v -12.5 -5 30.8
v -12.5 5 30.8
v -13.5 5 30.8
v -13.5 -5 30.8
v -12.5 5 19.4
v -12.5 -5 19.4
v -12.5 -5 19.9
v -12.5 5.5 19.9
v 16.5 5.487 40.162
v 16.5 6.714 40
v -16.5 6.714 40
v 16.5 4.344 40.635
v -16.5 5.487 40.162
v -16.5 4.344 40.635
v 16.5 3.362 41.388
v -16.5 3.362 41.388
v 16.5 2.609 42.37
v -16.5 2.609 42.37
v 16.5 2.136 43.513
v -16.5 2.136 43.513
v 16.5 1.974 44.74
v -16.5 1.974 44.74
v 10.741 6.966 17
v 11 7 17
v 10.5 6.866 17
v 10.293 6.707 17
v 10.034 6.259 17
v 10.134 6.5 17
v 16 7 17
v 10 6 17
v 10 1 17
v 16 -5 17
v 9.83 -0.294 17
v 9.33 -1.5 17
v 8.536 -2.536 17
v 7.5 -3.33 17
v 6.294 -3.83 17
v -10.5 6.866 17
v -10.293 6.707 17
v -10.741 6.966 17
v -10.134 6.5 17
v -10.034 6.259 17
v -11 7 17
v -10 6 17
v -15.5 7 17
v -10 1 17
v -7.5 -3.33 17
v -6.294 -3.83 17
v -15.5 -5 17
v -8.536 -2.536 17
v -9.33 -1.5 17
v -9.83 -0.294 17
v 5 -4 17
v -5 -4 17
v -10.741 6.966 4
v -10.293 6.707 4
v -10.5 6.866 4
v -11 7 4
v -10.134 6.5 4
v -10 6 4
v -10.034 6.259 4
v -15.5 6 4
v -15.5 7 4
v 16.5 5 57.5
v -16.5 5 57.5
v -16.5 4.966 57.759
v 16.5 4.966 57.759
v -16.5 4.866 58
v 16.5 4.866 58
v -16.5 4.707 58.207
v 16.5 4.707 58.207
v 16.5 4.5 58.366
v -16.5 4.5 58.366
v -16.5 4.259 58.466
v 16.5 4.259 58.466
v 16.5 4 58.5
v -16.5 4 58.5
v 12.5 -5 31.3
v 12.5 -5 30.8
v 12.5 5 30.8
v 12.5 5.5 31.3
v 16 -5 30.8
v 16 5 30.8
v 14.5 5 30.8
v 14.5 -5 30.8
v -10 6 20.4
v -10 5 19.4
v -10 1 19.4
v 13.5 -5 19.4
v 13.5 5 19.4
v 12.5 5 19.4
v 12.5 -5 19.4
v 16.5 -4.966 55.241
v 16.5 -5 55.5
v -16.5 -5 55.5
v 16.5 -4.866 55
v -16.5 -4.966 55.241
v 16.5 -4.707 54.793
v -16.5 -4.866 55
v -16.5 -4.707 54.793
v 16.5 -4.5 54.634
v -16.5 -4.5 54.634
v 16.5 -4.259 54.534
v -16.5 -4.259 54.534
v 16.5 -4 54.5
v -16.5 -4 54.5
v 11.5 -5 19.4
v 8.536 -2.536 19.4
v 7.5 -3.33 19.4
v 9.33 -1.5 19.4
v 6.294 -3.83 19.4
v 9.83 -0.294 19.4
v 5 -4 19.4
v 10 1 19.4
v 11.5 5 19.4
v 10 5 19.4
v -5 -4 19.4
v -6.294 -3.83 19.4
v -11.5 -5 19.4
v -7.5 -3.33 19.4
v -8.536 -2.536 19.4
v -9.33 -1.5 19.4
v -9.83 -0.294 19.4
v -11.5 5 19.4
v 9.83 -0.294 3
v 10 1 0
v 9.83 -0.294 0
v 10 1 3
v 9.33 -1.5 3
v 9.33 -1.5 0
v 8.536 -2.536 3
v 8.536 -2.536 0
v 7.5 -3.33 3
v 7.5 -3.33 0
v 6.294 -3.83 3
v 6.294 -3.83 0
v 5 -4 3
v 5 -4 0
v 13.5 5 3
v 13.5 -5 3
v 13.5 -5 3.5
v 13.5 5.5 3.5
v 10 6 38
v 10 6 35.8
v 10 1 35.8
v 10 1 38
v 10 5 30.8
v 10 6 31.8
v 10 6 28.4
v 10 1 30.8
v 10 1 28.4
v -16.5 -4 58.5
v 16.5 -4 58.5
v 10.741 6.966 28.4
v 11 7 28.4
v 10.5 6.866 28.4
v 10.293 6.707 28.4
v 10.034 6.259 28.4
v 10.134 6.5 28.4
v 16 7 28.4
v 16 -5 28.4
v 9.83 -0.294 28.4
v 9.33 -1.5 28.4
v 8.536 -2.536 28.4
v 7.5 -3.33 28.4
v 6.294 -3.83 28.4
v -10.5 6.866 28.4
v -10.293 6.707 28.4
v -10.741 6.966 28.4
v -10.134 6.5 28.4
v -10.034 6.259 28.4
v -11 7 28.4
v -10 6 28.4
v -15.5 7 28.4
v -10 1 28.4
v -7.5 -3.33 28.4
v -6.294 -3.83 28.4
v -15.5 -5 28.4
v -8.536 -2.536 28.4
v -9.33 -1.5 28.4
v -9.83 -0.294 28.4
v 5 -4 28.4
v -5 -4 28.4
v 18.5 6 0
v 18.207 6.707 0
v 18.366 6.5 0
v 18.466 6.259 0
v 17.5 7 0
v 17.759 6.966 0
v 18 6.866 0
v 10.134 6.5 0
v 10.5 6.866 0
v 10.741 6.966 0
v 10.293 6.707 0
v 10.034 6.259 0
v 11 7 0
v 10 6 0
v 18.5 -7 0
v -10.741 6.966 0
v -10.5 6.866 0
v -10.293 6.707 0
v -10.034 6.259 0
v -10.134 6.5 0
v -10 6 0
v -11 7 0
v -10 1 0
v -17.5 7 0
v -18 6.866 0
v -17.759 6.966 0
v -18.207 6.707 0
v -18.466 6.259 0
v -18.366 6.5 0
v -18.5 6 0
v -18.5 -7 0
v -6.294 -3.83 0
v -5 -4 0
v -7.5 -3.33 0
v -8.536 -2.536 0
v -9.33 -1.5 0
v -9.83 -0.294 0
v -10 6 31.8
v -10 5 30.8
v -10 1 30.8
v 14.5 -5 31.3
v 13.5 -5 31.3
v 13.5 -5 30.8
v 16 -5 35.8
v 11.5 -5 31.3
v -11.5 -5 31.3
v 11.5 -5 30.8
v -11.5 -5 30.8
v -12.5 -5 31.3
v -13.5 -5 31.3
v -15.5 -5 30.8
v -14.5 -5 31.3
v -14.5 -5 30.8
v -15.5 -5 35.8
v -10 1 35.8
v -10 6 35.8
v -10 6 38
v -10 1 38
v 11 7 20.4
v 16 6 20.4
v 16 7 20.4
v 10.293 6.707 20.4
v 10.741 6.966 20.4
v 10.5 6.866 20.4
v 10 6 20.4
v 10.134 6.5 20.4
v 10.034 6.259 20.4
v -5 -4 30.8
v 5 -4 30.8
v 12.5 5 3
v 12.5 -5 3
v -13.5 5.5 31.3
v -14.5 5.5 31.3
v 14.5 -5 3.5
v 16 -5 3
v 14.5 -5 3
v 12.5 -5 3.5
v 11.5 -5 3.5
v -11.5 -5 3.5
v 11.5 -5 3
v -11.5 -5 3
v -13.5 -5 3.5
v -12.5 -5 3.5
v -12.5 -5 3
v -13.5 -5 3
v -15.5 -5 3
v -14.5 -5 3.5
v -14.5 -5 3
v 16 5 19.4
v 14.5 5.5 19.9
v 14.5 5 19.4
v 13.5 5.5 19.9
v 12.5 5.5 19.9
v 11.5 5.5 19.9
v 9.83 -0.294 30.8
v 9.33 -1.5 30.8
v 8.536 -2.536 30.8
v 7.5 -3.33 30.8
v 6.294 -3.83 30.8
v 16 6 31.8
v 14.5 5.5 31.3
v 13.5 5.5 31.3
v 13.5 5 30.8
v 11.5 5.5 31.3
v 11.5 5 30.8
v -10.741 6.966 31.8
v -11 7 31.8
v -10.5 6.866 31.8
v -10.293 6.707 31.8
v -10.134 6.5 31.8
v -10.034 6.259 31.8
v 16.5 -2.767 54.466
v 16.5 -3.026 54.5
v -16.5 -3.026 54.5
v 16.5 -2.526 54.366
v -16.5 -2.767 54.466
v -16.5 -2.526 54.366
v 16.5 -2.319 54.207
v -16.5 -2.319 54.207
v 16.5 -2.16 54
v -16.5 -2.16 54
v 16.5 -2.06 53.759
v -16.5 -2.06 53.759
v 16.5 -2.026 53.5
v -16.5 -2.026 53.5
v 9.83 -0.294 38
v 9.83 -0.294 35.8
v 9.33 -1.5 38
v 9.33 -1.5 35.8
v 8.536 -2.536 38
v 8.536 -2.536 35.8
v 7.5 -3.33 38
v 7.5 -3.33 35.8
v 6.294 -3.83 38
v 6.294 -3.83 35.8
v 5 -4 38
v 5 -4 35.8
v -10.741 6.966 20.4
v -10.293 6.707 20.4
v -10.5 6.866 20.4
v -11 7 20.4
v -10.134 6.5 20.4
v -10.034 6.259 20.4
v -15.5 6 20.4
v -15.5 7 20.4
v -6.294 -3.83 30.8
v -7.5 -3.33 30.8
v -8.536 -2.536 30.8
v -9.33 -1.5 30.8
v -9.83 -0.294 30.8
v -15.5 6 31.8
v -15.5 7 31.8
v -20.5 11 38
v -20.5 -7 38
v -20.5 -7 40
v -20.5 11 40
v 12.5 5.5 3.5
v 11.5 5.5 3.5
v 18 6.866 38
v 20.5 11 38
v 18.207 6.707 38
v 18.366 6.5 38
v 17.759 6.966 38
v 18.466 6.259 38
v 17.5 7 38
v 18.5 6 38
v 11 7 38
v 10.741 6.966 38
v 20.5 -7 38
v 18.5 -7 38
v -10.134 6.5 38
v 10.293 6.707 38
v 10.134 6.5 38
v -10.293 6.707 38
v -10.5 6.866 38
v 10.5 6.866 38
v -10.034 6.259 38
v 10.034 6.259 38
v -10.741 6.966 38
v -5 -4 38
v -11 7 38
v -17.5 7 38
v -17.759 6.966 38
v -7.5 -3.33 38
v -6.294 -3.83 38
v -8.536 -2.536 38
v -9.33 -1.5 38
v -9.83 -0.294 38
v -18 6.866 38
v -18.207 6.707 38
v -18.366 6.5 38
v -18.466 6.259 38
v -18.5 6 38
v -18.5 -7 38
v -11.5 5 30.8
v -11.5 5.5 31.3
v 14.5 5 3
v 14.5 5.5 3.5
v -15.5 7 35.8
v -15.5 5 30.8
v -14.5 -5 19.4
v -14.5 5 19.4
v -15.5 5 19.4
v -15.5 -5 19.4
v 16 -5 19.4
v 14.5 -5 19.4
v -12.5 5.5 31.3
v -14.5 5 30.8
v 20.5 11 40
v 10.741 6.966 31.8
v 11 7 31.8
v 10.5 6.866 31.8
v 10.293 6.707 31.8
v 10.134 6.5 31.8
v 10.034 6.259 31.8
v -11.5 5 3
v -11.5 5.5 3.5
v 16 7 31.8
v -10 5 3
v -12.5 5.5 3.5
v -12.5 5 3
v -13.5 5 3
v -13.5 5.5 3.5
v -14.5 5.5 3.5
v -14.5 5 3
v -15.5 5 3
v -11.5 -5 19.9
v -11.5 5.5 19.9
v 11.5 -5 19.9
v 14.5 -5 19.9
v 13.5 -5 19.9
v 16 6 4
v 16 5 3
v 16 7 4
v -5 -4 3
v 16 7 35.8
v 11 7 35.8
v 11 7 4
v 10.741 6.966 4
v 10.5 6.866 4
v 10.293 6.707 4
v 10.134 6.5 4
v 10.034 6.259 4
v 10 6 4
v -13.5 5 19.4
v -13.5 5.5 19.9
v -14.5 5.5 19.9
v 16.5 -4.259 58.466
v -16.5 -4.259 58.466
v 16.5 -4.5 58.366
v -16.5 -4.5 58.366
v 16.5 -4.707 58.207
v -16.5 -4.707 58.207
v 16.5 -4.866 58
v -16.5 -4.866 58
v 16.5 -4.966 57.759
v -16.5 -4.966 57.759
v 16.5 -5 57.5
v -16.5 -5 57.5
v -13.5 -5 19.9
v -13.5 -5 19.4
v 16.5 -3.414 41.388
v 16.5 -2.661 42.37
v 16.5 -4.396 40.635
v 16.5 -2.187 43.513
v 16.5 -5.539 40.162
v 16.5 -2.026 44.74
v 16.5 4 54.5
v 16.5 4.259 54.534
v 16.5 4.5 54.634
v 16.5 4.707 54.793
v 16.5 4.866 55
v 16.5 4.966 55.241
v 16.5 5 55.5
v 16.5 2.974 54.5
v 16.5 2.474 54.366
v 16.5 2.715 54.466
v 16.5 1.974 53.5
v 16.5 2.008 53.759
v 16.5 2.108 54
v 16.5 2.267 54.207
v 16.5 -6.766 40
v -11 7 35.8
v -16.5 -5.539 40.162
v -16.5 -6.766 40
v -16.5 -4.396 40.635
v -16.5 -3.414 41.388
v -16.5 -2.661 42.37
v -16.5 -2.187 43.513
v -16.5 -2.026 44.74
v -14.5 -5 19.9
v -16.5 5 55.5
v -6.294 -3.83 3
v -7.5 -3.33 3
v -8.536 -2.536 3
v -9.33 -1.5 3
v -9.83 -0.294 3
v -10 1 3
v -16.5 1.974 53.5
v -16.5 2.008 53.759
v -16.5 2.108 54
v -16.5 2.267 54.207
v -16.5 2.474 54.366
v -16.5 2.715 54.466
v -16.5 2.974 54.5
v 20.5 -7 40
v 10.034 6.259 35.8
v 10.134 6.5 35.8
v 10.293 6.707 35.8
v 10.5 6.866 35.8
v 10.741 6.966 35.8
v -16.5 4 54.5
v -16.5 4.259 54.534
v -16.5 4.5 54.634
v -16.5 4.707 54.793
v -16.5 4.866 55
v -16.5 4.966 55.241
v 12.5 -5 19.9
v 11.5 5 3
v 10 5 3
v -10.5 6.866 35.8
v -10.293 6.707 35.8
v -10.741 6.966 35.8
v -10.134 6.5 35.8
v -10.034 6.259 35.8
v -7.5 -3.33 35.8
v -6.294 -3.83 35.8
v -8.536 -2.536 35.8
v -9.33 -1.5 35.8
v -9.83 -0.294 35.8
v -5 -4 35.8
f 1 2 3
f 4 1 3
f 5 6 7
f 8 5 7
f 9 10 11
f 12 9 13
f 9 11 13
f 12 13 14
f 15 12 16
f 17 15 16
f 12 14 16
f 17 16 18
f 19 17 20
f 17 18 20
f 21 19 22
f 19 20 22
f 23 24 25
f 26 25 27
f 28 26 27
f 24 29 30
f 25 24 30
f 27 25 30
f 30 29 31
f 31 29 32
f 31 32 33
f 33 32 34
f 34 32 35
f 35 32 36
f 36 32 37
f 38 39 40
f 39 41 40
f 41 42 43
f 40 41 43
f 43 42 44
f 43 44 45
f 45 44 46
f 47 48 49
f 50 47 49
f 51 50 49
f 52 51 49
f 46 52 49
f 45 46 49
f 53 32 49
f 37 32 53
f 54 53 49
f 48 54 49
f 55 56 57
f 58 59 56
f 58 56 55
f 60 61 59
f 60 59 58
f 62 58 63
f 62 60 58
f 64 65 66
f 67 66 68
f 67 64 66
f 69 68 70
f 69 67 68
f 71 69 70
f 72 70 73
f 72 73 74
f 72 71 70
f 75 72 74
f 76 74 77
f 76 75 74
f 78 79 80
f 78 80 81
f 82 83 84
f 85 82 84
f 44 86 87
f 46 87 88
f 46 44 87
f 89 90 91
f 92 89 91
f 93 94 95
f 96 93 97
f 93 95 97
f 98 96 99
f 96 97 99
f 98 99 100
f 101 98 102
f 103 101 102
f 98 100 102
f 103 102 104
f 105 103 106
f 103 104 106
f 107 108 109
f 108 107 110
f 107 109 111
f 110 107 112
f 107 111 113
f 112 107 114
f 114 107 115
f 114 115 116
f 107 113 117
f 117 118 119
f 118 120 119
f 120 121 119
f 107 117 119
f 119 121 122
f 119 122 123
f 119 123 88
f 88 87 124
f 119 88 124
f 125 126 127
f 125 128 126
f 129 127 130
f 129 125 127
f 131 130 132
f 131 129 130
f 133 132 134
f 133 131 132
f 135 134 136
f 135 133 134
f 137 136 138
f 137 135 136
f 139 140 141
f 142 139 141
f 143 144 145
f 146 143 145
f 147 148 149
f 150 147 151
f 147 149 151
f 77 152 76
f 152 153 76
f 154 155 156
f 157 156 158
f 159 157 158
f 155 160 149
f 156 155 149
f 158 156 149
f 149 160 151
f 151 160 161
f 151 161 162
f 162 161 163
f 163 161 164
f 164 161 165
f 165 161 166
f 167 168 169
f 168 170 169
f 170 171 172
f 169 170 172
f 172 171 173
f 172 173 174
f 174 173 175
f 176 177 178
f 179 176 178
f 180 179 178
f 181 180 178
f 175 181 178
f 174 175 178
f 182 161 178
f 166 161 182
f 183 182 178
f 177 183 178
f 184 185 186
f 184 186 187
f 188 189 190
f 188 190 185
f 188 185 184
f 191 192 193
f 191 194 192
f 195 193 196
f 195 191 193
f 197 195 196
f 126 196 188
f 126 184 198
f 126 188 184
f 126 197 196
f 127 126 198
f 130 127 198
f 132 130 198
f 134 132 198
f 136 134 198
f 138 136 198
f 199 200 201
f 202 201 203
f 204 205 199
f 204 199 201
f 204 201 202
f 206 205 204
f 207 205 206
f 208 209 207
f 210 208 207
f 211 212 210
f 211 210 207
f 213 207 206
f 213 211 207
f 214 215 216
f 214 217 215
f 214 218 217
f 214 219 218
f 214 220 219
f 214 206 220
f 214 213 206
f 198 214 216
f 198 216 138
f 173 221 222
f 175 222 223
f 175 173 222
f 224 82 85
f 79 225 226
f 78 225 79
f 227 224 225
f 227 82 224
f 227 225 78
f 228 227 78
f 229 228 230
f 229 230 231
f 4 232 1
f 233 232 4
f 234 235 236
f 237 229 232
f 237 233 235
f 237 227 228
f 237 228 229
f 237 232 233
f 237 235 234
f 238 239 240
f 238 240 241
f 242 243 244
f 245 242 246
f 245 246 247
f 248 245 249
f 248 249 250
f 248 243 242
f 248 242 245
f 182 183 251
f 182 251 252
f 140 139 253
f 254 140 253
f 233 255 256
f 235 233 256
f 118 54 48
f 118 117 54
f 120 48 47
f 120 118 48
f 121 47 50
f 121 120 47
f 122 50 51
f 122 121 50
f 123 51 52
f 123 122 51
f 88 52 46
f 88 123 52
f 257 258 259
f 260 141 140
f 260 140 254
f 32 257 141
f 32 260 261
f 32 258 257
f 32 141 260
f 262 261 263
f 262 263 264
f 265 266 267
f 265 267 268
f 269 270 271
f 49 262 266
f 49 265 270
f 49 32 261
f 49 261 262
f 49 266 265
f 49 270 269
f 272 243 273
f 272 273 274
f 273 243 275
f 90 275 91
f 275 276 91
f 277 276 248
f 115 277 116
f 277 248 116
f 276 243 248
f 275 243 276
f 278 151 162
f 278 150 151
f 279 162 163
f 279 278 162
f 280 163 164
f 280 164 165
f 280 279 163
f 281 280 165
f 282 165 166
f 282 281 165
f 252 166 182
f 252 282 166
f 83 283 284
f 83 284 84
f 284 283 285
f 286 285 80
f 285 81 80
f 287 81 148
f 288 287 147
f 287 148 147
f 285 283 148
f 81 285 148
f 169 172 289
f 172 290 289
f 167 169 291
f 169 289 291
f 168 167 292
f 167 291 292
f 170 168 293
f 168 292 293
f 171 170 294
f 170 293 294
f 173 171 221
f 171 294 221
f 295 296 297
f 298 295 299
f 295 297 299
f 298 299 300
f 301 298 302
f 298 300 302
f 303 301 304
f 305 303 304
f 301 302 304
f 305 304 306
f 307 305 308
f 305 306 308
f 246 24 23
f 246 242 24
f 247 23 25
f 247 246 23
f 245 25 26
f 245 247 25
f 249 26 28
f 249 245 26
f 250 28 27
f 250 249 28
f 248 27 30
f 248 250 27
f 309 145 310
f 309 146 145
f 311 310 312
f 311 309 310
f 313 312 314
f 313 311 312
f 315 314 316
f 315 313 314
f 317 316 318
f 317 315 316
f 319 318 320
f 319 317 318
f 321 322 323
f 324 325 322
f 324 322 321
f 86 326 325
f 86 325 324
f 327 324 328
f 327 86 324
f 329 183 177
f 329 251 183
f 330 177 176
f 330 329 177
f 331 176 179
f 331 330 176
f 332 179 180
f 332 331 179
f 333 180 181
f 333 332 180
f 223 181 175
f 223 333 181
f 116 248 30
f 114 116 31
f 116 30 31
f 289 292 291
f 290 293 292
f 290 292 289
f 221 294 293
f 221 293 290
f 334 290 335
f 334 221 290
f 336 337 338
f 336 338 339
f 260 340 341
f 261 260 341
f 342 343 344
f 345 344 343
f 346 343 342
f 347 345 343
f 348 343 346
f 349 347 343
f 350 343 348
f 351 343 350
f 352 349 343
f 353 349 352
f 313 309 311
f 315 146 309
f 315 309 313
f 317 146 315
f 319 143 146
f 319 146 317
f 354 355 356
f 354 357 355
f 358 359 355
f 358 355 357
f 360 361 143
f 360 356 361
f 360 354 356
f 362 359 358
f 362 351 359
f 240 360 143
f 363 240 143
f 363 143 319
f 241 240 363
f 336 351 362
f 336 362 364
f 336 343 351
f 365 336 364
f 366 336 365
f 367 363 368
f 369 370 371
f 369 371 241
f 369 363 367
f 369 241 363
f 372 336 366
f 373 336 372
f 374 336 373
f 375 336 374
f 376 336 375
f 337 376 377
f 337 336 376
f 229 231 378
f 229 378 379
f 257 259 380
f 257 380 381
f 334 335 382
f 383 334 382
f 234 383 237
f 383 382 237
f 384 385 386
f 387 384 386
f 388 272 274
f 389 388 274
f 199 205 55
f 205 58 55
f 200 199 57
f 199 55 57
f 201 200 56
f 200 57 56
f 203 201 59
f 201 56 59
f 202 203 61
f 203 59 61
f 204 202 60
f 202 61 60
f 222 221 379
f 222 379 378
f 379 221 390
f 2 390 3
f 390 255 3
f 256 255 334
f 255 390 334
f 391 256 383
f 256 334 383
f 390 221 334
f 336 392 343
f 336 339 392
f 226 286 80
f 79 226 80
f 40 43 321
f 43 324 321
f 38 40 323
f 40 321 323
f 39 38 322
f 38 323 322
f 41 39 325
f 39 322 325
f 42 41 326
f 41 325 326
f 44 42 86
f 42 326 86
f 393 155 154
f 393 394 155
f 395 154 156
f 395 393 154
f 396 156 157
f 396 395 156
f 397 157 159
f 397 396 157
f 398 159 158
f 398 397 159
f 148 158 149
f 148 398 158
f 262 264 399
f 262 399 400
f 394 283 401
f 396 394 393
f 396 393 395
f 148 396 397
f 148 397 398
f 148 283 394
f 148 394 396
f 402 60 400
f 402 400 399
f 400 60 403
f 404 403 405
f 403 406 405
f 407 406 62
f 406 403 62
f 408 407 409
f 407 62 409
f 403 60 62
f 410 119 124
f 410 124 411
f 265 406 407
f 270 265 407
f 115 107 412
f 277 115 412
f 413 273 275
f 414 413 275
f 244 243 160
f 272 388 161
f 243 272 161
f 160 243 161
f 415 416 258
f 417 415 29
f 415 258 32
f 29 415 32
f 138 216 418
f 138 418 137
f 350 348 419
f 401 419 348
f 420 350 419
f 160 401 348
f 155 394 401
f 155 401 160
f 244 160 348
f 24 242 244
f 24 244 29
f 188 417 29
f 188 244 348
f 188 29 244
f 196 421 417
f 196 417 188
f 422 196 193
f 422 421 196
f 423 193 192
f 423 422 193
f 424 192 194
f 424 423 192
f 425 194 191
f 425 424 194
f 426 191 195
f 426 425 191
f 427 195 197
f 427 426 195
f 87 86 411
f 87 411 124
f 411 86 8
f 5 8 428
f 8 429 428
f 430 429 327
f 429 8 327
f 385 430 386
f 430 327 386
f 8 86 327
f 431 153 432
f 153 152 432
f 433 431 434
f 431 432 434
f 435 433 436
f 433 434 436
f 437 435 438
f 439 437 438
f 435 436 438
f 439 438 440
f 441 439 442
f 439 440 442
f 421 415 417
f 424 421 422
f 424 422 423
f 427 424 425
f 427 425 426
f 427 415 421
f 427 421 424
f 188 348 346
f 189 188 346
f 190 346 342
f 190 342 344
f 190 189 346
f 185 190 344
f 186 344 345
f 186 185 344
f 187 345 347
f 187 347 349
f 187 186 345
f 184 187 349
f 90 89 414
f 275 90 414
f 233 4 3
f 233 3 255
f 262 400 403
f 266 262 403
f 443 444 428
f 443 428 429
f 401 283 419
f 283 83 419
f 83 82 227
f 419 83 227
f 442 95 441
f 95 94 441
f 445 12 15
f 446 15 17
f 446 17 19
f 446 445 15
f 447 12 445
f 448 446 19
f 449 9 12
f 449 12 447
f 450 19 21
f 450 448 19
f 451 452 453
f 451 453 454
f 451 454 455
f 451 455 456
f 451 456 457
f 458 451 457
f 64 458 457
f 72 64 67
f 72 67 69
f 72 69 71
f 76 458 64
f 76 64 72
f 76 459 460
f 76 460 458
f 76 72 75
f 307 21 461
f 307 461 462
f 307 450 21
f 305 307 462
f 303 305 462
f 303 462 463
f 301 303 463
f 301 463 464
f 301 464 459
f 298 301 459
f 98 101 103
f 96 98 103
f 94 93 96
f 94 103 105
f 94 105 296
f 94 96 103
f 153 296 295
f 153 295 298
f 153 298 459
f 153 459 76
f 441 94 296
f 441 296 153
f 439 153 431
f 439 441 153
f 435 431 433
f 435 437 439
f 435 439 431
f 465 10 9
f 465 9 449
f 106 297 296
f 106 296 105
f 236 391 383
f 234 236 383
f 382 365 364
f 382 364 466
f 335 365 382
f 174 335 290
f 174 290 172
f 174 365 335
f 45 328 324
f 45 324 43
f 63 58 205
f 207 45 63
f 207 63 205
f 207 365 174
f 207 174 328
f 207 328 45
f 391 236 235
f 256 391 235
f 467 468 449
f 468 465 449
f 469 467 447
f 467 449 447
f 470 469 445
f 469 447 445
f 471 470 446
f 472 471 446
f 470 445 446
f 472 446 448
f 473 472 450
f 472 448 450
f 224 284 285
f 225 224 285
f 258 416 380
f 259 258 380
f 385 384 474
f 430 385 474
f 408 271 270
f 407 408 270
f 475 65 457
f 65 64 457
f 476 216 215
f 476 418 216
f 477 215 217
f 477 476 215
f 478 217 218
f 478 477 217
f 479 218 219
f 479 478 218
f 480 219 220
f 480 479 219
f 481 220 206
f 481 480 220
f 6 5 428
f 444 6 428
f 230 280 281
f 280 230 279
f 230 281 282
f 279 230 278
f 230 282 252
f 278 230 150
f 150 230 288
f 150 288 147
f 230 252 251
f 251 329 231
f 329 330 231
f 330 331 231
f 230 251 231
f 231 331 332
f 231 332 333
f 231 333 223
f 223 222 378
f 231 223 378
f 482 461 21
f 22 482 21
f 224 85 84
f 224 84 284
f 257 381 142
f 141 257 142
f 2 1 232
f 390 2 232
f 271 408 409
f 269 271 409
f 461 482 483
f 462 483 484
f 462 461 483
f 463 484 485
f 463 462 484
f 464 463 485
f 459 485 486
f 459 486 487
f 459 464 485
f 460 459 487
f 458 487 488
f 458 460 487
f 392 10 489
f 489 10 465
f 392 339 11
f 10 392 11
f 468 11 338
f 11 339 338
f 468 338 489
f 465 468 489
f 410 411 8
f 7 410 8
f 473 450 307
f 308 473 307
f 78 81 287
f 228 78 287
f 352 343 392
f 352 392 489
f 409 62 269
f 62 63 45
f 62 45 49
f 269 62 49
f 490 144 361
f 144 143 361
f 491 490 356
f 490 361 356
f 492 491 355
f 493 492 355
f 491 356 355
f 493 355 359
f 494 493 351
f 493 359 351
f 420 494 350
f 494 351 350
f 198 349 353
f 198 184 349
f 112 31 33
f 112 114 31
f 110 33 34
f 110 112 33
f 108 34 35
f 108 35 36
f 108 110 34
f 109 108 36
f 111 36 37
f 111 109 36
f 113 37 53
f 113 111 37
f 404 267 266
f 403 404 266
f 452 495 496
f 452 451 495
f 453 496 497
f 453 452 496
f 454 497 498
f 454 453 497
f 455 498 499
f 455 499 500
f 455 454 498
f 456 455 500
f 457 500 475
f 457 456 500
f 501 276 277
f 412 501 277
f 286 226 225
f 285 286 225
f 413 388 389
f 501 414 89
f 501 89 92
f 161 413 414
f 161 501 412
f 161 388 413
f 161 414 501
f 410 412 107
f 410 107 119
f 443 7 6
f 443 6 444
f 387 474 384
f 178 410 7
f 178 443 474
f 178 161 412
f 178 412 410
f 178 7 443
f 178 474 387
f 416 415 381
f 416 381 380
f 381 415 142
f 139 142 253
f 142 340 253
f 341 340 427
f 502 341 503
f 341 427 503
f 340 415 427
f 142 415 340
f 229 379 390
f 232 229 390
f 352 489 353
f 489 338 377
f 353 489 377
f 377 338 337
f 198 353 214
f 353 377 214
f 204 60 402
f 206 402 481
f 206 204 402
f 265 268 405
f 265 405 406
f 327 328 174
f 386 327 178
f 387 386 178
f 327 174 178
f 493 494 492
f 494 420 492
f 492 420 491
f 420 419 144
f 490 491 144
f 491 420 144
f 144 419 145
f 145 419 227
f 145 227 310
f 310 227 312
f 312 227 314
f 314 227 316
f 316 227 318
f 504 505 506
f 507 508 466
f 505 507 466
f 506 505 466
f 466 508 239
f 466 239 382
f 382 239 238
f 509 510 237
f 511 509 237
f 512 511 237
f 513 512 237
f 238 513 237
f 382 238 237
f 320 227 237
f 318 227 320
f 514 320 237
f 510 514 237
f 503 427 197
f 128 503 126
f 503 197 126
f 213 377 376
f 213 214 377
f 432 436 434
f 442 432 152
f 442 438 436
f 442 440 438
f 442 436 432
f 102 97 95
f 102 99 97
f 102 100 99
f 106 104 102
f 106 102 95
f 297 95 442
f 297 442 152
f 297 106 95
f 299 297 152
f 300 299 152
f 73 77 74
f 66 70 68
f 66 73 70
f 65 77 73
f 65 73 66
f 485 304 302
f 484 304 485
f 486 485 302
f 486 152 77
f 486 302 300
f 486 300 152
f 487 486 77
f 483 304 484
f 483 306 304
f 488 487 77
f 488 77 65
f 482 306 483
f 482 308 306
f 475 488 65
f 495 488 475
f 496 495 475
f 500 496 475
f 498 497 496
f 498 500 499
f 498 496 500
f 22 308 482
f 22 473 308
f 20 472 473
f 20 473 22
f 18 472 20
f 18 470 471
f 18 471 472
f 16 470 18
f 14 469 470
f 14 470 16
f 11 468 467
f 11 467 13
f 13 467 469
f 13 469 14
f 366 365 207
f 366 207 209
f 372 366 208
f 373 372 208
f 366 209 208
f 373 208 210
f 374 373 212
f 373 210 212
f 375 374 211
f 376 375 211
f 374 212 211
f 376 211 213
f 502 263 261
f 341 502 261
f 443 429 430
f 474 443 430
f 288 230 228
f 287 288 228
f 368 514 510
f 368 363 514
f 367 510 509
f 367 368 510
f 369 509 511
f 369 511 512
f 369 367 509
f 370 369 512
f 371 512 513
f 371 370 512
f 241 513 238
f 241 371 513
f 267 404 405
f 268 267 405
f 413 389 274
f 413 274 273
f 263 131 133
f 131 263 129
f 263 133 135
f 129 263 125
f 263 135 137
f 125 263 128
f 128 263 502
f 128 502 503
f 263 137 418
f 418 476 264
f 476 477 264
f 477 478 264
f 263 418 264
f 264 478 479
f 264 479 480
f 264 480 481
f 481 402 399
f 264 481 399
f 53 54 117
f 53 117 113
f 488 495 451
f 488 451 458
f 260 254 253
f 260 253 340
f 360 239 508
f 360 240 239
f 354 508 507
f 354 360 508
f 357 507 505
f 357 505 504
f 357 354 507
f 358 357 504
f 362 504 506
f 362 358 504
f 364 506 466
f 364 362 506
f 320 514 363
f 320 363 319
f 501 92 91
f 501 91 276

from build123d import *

# Parameters (mm, degrees)
SKETCH_W           = 33
SKETCH_H           = 14
PAD_DEPTH          = 38
SKETCH001_W        = 4
SKETCH001_H        = 58.5
PAD001_DEPTH       = 33
SKETCH002_W        = 10
SKETCH002_H        = 4
PAD002_DEPTH       = 33
SKETCH003_W        = 32
SKETCH003_H        = 5
SKETCH003_H_2      = 9
SKETCH003_H_3      = 14
POCKET_DEPTH       = 12
POCKET_FACE14_W    = 33
POCKET_FACE14_H    = 38
POCKET_FACE14_W_2  = 32
POCKET_FACE14_H_2  = 5
POCKET_FACE14_H_3  = 9
POCKET_FACE14_H_4  = 14
POCKET001_DEPTH    = 2
SKETCH004_W        = 33
SKETCH004_H        = 38
SKETCH004_W_2      = 32
SKETCH004_H_2      = 4
SKETCH004_H_3      = 8
SKETCH004_H_4      = 13
PAD003_DEPTH       = 2
POCKET002_DEPTH    = 1
POCKET003_DEPTH    = 31.5
SKETCH006_W        = 14
SKETCH006_H        = 38
PAD004_DEPTH       = 1
PAD005_DEPTH       = 1
SKETCH007_W        = 37
SKETCH007_H        = 14
PAD006_DEPTH       = 2
SKETCH008_W        = 37
SKETCH008_H        = 2
PAD007_DEPTH       = 4
FILLET_R           = 4.74
FILLET001_R        = 4.74
FILLET002_R        = 1
FILLET003_R        = 1
FILLET004_R        = 1
FILLET005_R        = 1
FILLET005_FACE22_W = 18
FILLET005_FACE22_H = 2
PAD008_DEPTH       = 2
PAD008_FACE3_W     = 14
PAD008_FACE3_H     = 38
PAD009_DEPTH       = 2
PAD009_FACE3_W     = 18
PAD009_FACE3_H     = 2
PAD010_DEPTH       = 2
PAD010_FACE1_W     = 14
PAD010_FACE1_H     = 38
PAD011_DEPTH       = 2
SKETCH009_W        = 20
SKETCH009_H        = 11
POCKET004_DEPTH    = 38
FILLET006_R        = 5
FILLET007_R        = 1
FILLET008_R        = 1
SKETCH010_W        = 1
SKETCH010_H        = 0.5
PAD012_DEPTH       = 12


with BuildPart() as part:
    # Sketch → Pad (new body)
    with BuildSketch(Plane.XY):
        Rectangle(SKETCH_W, SKETCH_H)
    extrude(amount=PAD_DEPTH)

    # Sketch001 (on Face2 of Pad) → Pad001 (join)
    with BuildSketch(Plane.YZ.offset(16.5)):
        with Locations((-0.02597, 29.25)):
            Rectangle(SKETCH001_W, SKETCH001_H)
    extrude(amount=-PAD001_DEPTH)

    # Sketch002 (on Face9 of Pad001) → Pad002 (join)
    with BuildSketch(Plane.YZ.offset(16.5)):
        with Locations((0, 56.5)):
            Rectangle(SKETCH002_W, SKETCH002_H)
    extrude(amount=-PAD002_DEPTH)

    # Sketch003 (on Face4 of Pad002) → Pocket (cut)
    with BuildSketch(Plane(origin=(0, 7, 0), x_dir=(-1, 0, 0), z_dir=(0, 1, 0))):
        with Locations((0, 33.3)):
            Rectangle(SKETCH003_W, SKETCH003_H)
        with Locations((0, 23.9)):
            Rectangle(SKETCH003_W, SKETCH003_H_2)
        with Locations((0, 10)):
            Rectangle(SKETCH003_W, SKETCH003_H_3)
    extrude(amount=-POCKET_DEPTH, mode=Mode.SUBTRACT)

    # Pocket Face14 → Pocket001 (cut)
    with BuildSketch(Plane(origin=(0, 7, 19.929609), x_dir=(1, 0, 0), z_dir=(0, 1, 0))):
        with Locations((0, 0.929609)):
            Rectangle(POCKET_FACE14_W, POCKET_FACE14_H)
        with Locations((0, -13.370391)):
            Rectangle(POCKET_FACE14_W_2, POCKET_FACE14_H_2, mode=Mode.SUBTRACT)
        with Locations((0, -3.970391)):
            Rectangle(POCKET_FACE14_W_2, POCKET_FACE14_H_3, mode=Mode.SUBTRACT)
        with Locations((0, 9.929609)):
            Rectangle(POCKET_FACE14_W_2, POCKET_FACE14_H_4, mode=Mode.SUBTRACT)
    extrude(amount=-POCKET001_DEPTH, mode=Mode.SUBTRACT)

    # Sketch004 (on Face6 of Pocket001) → Pad003 (join)
    with BuildSketch(Plane(origin=(0, 5, 0), x_dir=(-1, 0, 0), z_dir=(0, 1, 0))):
        with Locations((0, 19)):
            Rectangle(SKETCH004_W, SKETCH004_H)
        with Locations((0, 33.8)):
            Rectangle(SKETCH004_W_2, SKETCH004_H_2, mode=Mode.SUBTRACT)
        with Locations((0, 24.4)):
            Rectangle(SKETCH004_W_2, SKETCH004_H_3, mode=Mode.SUBTRACT)
        with Locations((0, 10.5)):
            Rectangle(SKETCH004_W_2, SKETCH004_H_4, mode=Mode.SUBTRACT)
    extrude(amount=PAD003_DEPTH)

    # Pad003 Face14 → Pocket002 (cut)
    with BuildSketch(Plane(origin=(-16.5, -0.002687, 24.170063), x_dir=(0, 1, 0), z_dir=(-1, 0, 0))):
        Polygon((1.976717, -13.829937), (7.002687, -13.829937), (7.002687, 24.170063), (-6.997313, 24.170063), (-6.997313, -13.829937), (-2.023283, -13.829937), (-2.023283, -30.329937), (-4.997313, -30.329937), (-4.997313, -34.329937), (5.002687, -34.329937), (5.002687, -30.329937), (1.976717, -30.329937), align=None)
    extrude(amount=-POCKET002_DEPTH, mode=Mode.SUBTRACT)

    # Sketch005 (on Face4 of Pocket002) → Pocket003 (cut)
    with BuildSketch(Plane(origin=(-15.5, 0, 0), x_dir=(0, -1, 0), z_dir=(-1, 0, 0))):
        Polygon((-5, 3), (-5, 4), (-6, 4), align=None)
        Polygon((-5, 19.4), (-5, 20.4), (-6, 20.4), align=None)
        Polygon((-5, 30.8), (-5, 31.8), (-6, 31.8), align=None)
    extrude(amount=-POCKET003_DEPTH, mode=Mode.SUBTRACT)

    # Sketch006 (on Face4 of Pocket003) → Pad004 (join)
    with BuildSketch(Plane(origin=(-15.5, 0, 0), x_dir=(0, -1, 0), z_dir=(-1, 0, 0))):
        with Locations((0, 19)):
            Rectangle(SKETCH006_W, SKETCH006_H)
    extrude(amount=PAD004_DEPTH)

    # Pad004 Face9 → Pad005 (add)
    with BuildSketch(Plane(origin=(-15.5, -0.01617, 50.117925), x_dir=(0, 1, 0), z_dir=(-1, 0, 0))):
        Polygon((1.9902, -4.382075), (1.9902, 12.117925), (-2.0098, 12.117925), (-2.0098, -4.382075), (-4.98383, -4.382075), (-4.98383, -8.382075), (5.01617, -8.382075), (5.01617, -4.382075), align=None)
    extrude(amount=PAD005_DEPTH)

    # Sketch007 (on Face5 of Pad005) → Pad006 (join)
    with BuildSketch(Plane.XY.offset(38)):
        Rectangle(SKETCH007_W, SKETCH007_H)
    extrude(amount=PAD006_DEPTH)

    # Sketch008 (on Face19 of Pad006) → Pad007 (join)
    with BuildSketch(Plane(origin=(0, 7, 0), x_dir=(-1, 0, 0), z_dir=(0, 1, 0))):
        with Locations((0, 39)):
            Rectangle(SKETCH008_W, SKETCH008_H)
    extrude(amount=PAD007_DEPTH)

    # Fillet
    fillet_edges = [part.edges().sort_by_distance(p)[0] for p in [
        (0, -2.02597, 40),
    ]]
    fillet(fillet_edges, radius=FILLET_R)

    # Fillet001
    fillet001_edges = [part.edges().sort_by_distance(p)[0] for p in [
        (0, 1.97403, 40),
    ]]
    fillet(fillet001_edges, radius=FILLET001_R)

    # Fillet002
    fillet002_edges = [part.edges().sort_by_distance(p)[0] for p in [
        (0, -2.02597, 54.5),
    ]]
    fillet(fillet002_edges, radius=FILLET002_R)

    # Fillet003
    fillet003_edges = [part.edges().sort_by_distance(p)[0] for p in [
        (0, 1.97403, 54.5),
    ]]
    fillet(fillet003_edges, radius=FILLET003_R)

    # Fillet004
    fillet004_edges = [part.edges().sort_by_distance(p)[0] for p in [
        (0, 5, 54.5),
        (0, 5, 58.5),
    ]]
    fillet(fillet004_edges, radius=FILLET004_R)

    # Fillet005
    fillet005_edges = [part.edges().sort_by_distance(p)[0] for p in [
        (0, -5, 58.5),
        (0, -5, 54.5),
    ]]
    fillet(fillet005_edges, radius=FILLET005_R)

    # Fillet005 Face22 → Pad008 (add)
    with BuildSketch(Plane(origin=(-18.5, 2, 39), x_dir=(0, 1, 0), z_dir=(-1, 0, 0))):
        Rectangle(FILLET005_FACE22_W, FILLET005_FACE22_H)
    extrude(amount=PAD008_DEPTH)

    # Pad008 Face3 → Pad009 (add)
    with BuildSketch(Plane(origin=(-16.5, 0, 19), x_dir=(0, 1, 0), z_dir=(-1, 0, 0))):
        Rectangle(PAD008_FACE3_W, PAD008_FACE3_H)
    extrude(amount=PAD009_DEPTH)

    # Pad009 Face3 → Pad010 (add)
    with BuildSketch(Plane(origin=(18.5, 2, 39), x_dir=(0, -1, 0), z_dir=(1, 0, 0))):
        Rectangle(PAD009_FACE3_W, PAD009_FACE3_H)
    extrude(amount=PAD010_DEPTH)

    # Pad010 Face1 → Pad011 (add)
    with BuildSketch(Plane(origin=(16.5, 0, 19), x_dir=(0, -1, 0), z_dir=(1, 0, 0))):
        Rectangle(PAD010_FACE1_W, PAD010_FACE1_H)
    extrude(amount=PAD011_DEPTH)

    # Sketch009 (on Face47 of Pad011) → Pocket004 (cut)
    with BuildSketch(Plane(origin=(0, 0, 0), x_dir=(1, 0, 0), z_dir=(0, 0, -1))):
        with Locations((0, -1.5)):
            Rectangle(SKETCH009_W, SKETCH009_H)
    extrude(amount=-POCKET004_DEPTH, mode=Mode.SUBTRACT)

    # Fillet006
    fillet006_edges = [part.edges().sort_by_distance(p)[0] for p in [
        (-10, -4, 36.9),
        (-10, -4, 29.6),
        (-10, -4, 18.2),
        (-10, -4, 1.5),
        (10, -4, 36.9),
        (10, -4, 29.6),
        (10, -4, 18.2),
        (10, -4, 1.5),
    ]]
    fillet(fillet006_edges, radius=FILLET006_R)

    # Fillet007
    fillet007_edges = [part.edges().sort_by_distance(p)[0] for p in [
        (-10, 7, 36.9),
        (-10, 7, 30.1),
        (-10, 7, 18.7),
        (-10, 7, 2),
        (10, 7, 36.9),
        (10, 7, 30.1),
        (10, 7, 18.7),
        (10, 7, 2),
    ]]
    fillet(fillet007_edges, radius=FILLET007_R)

    # Fillet008
    fillet008_edges = [part.edges().sort_by_distance(p)[0] for p in [
        (18.5, 7, 19),
        (-18.5, 7, 19),
    ]]
    fillet(fillet008_edges, radius=FILLET008_R)

    # Sketch010 (on Face53 of Fillet008) → Pad012 (join)
    with BuildSketch(Plane(origin=(0, -5, 0), x_dir=(-1, 0, 0), z_dir=(0, 1, 0))):
        with Locations((-14, 31.05)):
            Rectangle(SKETCH010_W, SKETCH010_H)
        with Locations((14, 3.25)):
            Rectangle(SKETCH010_W, SKETCH010_H)
        with Locations((12, 3.25)):
            Rectangle(SKETCH010_W, SKETCH010_H)
        with Locations((-12, 3.25)):
            Rectangle(SKETCH010_W, SKETCH010_H)
        with Locations((-14, 3.25)):
            Rectangle(SKETCH010_W, SKETCH010_H)
        with Locations((-14, 19.65)):
            Rectangle(SKETCH010_W, SKETCH010_H)
        with Locations((14, 19.65)):
            Rectangle(SKETCH010_W, SKETCH010_H)
        with Locations((12, 19.65)):
            Rectangle(SKETCH010_W, SKETCH010_H)
        with Locations((-12, 19.65)):
            Rectangle(SKETCH010_W, SKETCH010_H)
        with Locations((-12, 31.05)):
            Rectangle(SKETCH010_W, SKETCH010_H)
        with Locations((12, 31.05)):
            Rectangle(SKETCH010_W, SKETCH010_H)
        with Locations((14, 31.05)):
            Rectangle(SKETCH010_W, SKETCH010_H)
    extrude(amount=PAD012_DEPTH)


solid = part.part
